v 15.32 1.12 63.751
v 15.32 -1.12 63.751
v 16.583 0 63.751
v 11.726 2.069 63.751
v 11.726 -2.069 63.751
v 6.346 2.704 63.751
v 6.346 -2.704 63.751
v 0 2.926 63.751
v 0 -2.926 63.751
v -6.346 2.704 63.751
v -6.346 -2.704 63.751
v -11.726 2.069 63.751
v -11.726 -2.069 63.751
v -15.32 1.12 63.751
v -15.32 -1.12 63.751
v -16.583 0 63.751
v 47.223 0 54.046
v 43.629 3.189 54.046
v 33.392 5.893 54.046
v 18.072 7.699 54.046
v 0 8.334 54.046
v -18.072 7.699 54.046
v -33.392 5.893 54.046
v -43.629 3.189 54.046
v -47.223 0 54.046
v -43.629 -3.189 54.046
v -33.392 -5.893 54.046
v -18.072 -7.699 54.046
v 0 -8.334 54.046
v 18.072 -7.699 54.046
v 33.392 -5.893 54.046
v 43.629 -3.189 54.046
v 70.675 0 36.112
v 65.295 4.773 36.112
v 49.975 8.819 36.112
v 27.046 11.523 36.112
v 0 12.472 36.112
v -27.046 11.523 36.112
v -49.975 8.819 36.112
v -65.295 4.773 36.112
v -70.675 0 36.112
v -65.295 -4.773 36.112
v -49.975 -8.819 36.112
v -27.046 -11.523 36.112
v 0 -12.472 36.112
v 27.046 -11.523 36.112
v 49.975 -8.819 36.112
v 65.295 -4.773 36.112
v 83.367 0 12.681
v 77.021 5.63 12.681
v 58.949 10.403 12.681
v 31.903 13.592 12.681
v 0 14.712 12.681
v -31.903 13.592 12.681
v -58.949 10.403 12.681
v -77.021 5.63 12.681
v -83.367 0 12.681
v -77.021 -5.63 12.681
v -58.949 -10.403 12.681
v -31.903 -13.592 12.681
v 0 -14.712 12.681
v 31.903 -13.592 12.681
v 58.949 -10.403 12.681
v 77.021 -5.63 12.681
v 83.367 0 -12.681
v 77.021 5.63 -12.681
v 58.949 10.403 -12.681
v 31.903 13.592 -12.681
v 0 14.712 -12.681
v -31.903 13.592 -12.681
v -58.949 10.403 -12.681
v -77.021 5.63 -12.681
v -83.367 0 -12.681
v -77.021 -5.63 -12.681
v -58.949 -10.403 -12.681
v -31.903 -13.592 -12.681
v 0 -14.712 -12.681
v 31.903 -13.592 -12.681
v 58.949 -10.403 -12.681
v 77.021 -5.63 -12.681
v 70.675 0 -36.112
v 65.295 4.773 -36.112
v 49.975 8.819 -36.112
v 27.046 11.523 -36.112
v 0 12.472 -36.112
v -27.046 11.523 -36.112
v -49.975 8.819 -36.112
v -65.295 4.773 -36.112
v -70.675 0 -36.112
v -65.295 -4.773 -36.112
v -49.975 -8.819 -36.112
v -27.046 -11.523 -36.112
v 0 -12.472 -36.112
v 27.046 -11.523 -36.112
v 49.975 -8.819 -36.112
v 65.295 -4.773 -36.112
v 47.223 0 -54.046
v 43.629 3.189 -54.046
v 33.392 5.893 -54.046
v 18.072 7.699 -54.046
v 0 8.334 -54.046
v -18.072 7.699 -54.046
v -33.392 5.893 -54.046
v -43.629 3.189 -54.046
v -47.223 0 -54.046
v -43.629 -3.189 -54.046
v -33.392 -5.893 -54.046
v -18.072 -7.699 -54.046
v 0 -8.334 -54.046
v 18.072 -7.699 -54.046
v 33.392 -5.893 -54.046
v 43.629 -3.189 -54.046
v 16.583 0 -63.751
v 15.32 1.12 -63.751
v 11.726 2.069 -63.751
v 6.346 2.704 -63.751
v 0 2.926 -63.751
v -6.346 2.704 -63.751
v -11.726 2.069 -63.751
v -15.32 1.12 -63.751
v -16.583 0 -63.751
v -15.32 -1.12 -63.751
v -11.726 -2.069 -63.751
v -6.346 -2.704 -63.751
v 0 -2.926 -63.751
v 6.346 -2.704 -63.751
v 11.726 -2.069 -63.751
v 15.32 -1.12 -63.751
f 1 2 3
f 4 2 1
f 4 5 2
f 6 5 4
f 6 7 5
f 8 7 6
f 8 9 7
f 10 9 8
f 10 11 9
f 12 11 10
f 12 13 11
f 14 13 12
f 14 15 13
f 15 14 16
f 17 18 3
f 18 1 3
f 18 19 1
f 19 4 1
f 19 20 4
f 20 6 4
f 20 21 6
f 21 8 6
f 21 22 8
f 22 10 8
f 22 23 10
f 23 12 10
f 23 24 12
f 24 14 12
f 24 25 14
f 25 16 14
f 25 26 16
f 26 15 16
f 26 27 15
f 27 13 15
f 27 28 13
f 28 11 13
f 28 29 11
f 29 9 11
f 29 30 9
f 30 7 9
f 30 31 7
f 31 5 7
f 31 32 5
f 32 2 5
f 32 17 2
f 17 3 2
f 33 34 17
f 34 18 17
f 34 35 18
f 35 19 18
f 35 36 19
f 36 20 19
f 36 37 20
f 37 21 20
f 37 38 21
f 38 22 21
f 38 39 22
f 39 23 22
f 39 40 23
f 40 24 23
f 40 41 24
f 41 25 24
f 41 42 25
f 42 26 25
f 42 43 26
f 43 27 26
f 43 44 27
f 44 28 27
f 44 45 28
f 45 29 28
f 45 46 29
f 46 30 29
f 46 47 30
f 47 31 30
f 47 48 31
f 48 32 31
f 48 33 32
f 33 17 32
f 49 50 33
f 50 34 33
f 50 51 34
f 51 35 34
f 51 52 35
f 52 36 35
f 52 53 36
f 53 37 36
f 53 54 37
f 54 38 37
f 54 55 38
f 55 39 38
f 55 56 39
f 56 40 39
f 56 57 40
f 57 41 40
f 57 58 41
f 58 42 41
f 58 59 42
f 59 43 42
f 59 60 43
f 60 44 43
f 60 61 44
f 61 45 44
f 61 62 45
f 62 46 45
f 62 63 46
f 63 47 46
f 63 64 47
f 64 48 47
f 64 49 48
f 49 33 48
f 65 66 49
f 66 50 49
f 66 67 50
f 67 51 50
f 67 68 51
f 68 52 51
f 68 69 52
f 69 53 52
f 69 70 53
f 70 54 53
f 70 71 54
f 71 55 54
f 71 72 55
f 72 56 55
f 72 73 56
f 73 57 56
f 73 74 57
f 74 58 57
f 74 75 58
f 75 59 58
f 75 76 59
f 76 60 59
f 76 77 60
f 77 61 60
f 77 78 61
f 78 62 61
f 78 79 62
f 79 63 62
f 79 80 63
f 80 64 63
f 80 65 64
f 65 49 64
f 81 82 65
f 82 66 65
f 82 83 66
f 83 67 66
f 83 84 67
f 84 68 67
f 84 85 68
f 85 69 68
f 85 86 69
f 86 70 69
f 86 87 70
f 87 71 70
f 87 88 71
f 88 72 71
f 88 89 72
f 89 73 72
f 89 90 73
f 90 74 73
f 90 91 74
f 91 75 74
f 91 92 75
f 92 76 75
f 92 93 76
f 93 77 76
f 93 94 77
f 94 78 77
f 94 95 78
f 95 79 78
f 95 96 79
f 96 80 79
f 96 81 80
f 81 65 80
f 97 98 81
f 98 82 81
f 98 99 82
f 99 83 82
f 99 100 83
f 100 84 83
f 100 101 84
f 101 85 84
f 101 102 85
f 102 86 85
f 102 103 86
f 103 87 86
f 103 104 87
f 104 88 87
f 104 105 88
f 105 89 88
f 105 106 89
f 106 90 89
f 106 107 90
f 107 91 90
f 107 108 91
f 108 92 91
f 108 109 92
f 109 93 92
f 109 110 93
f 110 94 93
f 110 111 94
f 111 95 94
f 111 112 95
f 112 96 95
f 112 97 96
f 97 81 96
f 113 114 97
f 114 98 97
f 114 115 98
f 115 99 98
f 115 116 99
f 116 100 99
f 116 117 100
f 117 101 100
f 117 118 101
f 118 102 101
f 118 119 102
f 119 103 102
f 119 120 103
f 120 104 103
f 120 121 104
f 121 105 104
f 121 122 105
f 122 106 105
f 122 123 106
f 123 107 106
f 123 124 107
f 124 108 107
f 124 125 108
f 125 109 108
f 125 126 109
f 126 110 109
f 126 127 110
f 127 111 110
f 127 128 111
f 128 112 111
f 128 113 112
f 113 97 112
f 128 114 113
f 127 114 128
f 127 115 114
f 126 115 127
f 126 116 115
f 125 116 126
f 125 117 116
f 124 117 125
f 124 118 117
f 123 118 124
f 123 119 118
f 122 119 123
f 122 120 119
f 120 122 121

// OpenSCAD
// Generated by SolidPython 1.0.1 on 2020-07-29 00:46:52


scale(v = [17, 3, 13]) {
	sphere(r = 5);
}
/***********************************************
*********      SolidPython code:      **********
************************************************
 
# import packages: SolidPython
from solid import *
from solid.utils import *
from itertools import chain, combinations, permutations


class Resize:

    def __init__(self, scad_file):
        self.scad_file = scad_file
        #self.scad_file = import_scad(scad_file)
        # cone/cylinder param:
        self.r1 = 0
        self.r2 = 0
        self.h = 0
        # rectangular prism param:
        self.w = 0
        self.l = 0
        # ellipse param:
        self.r = 0

    # import OpenScad code (file name corresponds to shape)


    # classify shape + parameters
    def assign(self, param1, param2, param3):
        if self.scad_file == 'cone.scad':
            self.r1 = param1
            self.r2 = param2
            self.h = param3
        elif self.scad_file == 'cylinder.scad':
            self.r1 = param1
            self.r2 = param2
            self.h = param3
        elif self.scad_file == 'rectangularPrism.scad':
            self.h = param1
            self.l = param2
            self.w = param3
        else:
            self.r = param1
            self.h = param2

    # resize parameters
    def iterate(self):
        x = range(3, 20, 2)
        i = 1
        if self.scad_file == 'cone.scad':
            tempList = list(permutations(x, 2))
            for temp in tempList:
                param1 = temp[0]
                param2 = temp[1]
                filepath = 'produced_scad_files/' + 'cone' + str(param1) + '_' + str(param2) + '_' + '.scad'
                scad_render_to_file(cylinder(h=param1, r1=param2, r2=0), filepath)

        elif self.scad_file == 'cylinder.scad':
            tempList = list(permutations(x, 3))
            for temp in tempList:
                param1 = temp[0]
                param2 = temp[1]
                filepath = 'produced_scad_files/' + 'cylinder' + str(param1) + '_' + str(param2) + '_' + '.scad'
                scad_render_to_file(cylinder(h=param1, r1=param2, r2=param2), filepath)

        elif self.scad_file == 'rectangularPrism.scad':
            tempList = list(permutations(x, 3))
            for temp in tempList:
                param1 = temp[0]
                param2 = temp[1]
                param3 = temp[2]
                filepath = 'produced_scad_files/' + 'rectangularPrism' + str(param1) + '_' + str(param2) + '_' + str(
                    param3) + '.scad'
                scad_render_to_file(cube(size=(param1, param2, param3)), filepath)

        elif self.scad_file == 'ellipse.scad':
            tempList = list(permutations(x, 4))
            for temp in tempList:
                param1 = temp[0]
                param2 = temp[1]
                param3 = temp[2]
                param4 = temp[3]
                filepath = 'produced_scad_files/' + 'ellipse' + str(param1) + '_' + str(param2) + '_' + str(param3) + '_' + str(param4) + '.scad'
                scad_render_to_file(scale([param1, param2, param3])(sphere(r=param4)), filepath)

    def render_to_scadfile(self):
        scad_render_to_file(scad, 'example.scad') 
 
************************************************/
